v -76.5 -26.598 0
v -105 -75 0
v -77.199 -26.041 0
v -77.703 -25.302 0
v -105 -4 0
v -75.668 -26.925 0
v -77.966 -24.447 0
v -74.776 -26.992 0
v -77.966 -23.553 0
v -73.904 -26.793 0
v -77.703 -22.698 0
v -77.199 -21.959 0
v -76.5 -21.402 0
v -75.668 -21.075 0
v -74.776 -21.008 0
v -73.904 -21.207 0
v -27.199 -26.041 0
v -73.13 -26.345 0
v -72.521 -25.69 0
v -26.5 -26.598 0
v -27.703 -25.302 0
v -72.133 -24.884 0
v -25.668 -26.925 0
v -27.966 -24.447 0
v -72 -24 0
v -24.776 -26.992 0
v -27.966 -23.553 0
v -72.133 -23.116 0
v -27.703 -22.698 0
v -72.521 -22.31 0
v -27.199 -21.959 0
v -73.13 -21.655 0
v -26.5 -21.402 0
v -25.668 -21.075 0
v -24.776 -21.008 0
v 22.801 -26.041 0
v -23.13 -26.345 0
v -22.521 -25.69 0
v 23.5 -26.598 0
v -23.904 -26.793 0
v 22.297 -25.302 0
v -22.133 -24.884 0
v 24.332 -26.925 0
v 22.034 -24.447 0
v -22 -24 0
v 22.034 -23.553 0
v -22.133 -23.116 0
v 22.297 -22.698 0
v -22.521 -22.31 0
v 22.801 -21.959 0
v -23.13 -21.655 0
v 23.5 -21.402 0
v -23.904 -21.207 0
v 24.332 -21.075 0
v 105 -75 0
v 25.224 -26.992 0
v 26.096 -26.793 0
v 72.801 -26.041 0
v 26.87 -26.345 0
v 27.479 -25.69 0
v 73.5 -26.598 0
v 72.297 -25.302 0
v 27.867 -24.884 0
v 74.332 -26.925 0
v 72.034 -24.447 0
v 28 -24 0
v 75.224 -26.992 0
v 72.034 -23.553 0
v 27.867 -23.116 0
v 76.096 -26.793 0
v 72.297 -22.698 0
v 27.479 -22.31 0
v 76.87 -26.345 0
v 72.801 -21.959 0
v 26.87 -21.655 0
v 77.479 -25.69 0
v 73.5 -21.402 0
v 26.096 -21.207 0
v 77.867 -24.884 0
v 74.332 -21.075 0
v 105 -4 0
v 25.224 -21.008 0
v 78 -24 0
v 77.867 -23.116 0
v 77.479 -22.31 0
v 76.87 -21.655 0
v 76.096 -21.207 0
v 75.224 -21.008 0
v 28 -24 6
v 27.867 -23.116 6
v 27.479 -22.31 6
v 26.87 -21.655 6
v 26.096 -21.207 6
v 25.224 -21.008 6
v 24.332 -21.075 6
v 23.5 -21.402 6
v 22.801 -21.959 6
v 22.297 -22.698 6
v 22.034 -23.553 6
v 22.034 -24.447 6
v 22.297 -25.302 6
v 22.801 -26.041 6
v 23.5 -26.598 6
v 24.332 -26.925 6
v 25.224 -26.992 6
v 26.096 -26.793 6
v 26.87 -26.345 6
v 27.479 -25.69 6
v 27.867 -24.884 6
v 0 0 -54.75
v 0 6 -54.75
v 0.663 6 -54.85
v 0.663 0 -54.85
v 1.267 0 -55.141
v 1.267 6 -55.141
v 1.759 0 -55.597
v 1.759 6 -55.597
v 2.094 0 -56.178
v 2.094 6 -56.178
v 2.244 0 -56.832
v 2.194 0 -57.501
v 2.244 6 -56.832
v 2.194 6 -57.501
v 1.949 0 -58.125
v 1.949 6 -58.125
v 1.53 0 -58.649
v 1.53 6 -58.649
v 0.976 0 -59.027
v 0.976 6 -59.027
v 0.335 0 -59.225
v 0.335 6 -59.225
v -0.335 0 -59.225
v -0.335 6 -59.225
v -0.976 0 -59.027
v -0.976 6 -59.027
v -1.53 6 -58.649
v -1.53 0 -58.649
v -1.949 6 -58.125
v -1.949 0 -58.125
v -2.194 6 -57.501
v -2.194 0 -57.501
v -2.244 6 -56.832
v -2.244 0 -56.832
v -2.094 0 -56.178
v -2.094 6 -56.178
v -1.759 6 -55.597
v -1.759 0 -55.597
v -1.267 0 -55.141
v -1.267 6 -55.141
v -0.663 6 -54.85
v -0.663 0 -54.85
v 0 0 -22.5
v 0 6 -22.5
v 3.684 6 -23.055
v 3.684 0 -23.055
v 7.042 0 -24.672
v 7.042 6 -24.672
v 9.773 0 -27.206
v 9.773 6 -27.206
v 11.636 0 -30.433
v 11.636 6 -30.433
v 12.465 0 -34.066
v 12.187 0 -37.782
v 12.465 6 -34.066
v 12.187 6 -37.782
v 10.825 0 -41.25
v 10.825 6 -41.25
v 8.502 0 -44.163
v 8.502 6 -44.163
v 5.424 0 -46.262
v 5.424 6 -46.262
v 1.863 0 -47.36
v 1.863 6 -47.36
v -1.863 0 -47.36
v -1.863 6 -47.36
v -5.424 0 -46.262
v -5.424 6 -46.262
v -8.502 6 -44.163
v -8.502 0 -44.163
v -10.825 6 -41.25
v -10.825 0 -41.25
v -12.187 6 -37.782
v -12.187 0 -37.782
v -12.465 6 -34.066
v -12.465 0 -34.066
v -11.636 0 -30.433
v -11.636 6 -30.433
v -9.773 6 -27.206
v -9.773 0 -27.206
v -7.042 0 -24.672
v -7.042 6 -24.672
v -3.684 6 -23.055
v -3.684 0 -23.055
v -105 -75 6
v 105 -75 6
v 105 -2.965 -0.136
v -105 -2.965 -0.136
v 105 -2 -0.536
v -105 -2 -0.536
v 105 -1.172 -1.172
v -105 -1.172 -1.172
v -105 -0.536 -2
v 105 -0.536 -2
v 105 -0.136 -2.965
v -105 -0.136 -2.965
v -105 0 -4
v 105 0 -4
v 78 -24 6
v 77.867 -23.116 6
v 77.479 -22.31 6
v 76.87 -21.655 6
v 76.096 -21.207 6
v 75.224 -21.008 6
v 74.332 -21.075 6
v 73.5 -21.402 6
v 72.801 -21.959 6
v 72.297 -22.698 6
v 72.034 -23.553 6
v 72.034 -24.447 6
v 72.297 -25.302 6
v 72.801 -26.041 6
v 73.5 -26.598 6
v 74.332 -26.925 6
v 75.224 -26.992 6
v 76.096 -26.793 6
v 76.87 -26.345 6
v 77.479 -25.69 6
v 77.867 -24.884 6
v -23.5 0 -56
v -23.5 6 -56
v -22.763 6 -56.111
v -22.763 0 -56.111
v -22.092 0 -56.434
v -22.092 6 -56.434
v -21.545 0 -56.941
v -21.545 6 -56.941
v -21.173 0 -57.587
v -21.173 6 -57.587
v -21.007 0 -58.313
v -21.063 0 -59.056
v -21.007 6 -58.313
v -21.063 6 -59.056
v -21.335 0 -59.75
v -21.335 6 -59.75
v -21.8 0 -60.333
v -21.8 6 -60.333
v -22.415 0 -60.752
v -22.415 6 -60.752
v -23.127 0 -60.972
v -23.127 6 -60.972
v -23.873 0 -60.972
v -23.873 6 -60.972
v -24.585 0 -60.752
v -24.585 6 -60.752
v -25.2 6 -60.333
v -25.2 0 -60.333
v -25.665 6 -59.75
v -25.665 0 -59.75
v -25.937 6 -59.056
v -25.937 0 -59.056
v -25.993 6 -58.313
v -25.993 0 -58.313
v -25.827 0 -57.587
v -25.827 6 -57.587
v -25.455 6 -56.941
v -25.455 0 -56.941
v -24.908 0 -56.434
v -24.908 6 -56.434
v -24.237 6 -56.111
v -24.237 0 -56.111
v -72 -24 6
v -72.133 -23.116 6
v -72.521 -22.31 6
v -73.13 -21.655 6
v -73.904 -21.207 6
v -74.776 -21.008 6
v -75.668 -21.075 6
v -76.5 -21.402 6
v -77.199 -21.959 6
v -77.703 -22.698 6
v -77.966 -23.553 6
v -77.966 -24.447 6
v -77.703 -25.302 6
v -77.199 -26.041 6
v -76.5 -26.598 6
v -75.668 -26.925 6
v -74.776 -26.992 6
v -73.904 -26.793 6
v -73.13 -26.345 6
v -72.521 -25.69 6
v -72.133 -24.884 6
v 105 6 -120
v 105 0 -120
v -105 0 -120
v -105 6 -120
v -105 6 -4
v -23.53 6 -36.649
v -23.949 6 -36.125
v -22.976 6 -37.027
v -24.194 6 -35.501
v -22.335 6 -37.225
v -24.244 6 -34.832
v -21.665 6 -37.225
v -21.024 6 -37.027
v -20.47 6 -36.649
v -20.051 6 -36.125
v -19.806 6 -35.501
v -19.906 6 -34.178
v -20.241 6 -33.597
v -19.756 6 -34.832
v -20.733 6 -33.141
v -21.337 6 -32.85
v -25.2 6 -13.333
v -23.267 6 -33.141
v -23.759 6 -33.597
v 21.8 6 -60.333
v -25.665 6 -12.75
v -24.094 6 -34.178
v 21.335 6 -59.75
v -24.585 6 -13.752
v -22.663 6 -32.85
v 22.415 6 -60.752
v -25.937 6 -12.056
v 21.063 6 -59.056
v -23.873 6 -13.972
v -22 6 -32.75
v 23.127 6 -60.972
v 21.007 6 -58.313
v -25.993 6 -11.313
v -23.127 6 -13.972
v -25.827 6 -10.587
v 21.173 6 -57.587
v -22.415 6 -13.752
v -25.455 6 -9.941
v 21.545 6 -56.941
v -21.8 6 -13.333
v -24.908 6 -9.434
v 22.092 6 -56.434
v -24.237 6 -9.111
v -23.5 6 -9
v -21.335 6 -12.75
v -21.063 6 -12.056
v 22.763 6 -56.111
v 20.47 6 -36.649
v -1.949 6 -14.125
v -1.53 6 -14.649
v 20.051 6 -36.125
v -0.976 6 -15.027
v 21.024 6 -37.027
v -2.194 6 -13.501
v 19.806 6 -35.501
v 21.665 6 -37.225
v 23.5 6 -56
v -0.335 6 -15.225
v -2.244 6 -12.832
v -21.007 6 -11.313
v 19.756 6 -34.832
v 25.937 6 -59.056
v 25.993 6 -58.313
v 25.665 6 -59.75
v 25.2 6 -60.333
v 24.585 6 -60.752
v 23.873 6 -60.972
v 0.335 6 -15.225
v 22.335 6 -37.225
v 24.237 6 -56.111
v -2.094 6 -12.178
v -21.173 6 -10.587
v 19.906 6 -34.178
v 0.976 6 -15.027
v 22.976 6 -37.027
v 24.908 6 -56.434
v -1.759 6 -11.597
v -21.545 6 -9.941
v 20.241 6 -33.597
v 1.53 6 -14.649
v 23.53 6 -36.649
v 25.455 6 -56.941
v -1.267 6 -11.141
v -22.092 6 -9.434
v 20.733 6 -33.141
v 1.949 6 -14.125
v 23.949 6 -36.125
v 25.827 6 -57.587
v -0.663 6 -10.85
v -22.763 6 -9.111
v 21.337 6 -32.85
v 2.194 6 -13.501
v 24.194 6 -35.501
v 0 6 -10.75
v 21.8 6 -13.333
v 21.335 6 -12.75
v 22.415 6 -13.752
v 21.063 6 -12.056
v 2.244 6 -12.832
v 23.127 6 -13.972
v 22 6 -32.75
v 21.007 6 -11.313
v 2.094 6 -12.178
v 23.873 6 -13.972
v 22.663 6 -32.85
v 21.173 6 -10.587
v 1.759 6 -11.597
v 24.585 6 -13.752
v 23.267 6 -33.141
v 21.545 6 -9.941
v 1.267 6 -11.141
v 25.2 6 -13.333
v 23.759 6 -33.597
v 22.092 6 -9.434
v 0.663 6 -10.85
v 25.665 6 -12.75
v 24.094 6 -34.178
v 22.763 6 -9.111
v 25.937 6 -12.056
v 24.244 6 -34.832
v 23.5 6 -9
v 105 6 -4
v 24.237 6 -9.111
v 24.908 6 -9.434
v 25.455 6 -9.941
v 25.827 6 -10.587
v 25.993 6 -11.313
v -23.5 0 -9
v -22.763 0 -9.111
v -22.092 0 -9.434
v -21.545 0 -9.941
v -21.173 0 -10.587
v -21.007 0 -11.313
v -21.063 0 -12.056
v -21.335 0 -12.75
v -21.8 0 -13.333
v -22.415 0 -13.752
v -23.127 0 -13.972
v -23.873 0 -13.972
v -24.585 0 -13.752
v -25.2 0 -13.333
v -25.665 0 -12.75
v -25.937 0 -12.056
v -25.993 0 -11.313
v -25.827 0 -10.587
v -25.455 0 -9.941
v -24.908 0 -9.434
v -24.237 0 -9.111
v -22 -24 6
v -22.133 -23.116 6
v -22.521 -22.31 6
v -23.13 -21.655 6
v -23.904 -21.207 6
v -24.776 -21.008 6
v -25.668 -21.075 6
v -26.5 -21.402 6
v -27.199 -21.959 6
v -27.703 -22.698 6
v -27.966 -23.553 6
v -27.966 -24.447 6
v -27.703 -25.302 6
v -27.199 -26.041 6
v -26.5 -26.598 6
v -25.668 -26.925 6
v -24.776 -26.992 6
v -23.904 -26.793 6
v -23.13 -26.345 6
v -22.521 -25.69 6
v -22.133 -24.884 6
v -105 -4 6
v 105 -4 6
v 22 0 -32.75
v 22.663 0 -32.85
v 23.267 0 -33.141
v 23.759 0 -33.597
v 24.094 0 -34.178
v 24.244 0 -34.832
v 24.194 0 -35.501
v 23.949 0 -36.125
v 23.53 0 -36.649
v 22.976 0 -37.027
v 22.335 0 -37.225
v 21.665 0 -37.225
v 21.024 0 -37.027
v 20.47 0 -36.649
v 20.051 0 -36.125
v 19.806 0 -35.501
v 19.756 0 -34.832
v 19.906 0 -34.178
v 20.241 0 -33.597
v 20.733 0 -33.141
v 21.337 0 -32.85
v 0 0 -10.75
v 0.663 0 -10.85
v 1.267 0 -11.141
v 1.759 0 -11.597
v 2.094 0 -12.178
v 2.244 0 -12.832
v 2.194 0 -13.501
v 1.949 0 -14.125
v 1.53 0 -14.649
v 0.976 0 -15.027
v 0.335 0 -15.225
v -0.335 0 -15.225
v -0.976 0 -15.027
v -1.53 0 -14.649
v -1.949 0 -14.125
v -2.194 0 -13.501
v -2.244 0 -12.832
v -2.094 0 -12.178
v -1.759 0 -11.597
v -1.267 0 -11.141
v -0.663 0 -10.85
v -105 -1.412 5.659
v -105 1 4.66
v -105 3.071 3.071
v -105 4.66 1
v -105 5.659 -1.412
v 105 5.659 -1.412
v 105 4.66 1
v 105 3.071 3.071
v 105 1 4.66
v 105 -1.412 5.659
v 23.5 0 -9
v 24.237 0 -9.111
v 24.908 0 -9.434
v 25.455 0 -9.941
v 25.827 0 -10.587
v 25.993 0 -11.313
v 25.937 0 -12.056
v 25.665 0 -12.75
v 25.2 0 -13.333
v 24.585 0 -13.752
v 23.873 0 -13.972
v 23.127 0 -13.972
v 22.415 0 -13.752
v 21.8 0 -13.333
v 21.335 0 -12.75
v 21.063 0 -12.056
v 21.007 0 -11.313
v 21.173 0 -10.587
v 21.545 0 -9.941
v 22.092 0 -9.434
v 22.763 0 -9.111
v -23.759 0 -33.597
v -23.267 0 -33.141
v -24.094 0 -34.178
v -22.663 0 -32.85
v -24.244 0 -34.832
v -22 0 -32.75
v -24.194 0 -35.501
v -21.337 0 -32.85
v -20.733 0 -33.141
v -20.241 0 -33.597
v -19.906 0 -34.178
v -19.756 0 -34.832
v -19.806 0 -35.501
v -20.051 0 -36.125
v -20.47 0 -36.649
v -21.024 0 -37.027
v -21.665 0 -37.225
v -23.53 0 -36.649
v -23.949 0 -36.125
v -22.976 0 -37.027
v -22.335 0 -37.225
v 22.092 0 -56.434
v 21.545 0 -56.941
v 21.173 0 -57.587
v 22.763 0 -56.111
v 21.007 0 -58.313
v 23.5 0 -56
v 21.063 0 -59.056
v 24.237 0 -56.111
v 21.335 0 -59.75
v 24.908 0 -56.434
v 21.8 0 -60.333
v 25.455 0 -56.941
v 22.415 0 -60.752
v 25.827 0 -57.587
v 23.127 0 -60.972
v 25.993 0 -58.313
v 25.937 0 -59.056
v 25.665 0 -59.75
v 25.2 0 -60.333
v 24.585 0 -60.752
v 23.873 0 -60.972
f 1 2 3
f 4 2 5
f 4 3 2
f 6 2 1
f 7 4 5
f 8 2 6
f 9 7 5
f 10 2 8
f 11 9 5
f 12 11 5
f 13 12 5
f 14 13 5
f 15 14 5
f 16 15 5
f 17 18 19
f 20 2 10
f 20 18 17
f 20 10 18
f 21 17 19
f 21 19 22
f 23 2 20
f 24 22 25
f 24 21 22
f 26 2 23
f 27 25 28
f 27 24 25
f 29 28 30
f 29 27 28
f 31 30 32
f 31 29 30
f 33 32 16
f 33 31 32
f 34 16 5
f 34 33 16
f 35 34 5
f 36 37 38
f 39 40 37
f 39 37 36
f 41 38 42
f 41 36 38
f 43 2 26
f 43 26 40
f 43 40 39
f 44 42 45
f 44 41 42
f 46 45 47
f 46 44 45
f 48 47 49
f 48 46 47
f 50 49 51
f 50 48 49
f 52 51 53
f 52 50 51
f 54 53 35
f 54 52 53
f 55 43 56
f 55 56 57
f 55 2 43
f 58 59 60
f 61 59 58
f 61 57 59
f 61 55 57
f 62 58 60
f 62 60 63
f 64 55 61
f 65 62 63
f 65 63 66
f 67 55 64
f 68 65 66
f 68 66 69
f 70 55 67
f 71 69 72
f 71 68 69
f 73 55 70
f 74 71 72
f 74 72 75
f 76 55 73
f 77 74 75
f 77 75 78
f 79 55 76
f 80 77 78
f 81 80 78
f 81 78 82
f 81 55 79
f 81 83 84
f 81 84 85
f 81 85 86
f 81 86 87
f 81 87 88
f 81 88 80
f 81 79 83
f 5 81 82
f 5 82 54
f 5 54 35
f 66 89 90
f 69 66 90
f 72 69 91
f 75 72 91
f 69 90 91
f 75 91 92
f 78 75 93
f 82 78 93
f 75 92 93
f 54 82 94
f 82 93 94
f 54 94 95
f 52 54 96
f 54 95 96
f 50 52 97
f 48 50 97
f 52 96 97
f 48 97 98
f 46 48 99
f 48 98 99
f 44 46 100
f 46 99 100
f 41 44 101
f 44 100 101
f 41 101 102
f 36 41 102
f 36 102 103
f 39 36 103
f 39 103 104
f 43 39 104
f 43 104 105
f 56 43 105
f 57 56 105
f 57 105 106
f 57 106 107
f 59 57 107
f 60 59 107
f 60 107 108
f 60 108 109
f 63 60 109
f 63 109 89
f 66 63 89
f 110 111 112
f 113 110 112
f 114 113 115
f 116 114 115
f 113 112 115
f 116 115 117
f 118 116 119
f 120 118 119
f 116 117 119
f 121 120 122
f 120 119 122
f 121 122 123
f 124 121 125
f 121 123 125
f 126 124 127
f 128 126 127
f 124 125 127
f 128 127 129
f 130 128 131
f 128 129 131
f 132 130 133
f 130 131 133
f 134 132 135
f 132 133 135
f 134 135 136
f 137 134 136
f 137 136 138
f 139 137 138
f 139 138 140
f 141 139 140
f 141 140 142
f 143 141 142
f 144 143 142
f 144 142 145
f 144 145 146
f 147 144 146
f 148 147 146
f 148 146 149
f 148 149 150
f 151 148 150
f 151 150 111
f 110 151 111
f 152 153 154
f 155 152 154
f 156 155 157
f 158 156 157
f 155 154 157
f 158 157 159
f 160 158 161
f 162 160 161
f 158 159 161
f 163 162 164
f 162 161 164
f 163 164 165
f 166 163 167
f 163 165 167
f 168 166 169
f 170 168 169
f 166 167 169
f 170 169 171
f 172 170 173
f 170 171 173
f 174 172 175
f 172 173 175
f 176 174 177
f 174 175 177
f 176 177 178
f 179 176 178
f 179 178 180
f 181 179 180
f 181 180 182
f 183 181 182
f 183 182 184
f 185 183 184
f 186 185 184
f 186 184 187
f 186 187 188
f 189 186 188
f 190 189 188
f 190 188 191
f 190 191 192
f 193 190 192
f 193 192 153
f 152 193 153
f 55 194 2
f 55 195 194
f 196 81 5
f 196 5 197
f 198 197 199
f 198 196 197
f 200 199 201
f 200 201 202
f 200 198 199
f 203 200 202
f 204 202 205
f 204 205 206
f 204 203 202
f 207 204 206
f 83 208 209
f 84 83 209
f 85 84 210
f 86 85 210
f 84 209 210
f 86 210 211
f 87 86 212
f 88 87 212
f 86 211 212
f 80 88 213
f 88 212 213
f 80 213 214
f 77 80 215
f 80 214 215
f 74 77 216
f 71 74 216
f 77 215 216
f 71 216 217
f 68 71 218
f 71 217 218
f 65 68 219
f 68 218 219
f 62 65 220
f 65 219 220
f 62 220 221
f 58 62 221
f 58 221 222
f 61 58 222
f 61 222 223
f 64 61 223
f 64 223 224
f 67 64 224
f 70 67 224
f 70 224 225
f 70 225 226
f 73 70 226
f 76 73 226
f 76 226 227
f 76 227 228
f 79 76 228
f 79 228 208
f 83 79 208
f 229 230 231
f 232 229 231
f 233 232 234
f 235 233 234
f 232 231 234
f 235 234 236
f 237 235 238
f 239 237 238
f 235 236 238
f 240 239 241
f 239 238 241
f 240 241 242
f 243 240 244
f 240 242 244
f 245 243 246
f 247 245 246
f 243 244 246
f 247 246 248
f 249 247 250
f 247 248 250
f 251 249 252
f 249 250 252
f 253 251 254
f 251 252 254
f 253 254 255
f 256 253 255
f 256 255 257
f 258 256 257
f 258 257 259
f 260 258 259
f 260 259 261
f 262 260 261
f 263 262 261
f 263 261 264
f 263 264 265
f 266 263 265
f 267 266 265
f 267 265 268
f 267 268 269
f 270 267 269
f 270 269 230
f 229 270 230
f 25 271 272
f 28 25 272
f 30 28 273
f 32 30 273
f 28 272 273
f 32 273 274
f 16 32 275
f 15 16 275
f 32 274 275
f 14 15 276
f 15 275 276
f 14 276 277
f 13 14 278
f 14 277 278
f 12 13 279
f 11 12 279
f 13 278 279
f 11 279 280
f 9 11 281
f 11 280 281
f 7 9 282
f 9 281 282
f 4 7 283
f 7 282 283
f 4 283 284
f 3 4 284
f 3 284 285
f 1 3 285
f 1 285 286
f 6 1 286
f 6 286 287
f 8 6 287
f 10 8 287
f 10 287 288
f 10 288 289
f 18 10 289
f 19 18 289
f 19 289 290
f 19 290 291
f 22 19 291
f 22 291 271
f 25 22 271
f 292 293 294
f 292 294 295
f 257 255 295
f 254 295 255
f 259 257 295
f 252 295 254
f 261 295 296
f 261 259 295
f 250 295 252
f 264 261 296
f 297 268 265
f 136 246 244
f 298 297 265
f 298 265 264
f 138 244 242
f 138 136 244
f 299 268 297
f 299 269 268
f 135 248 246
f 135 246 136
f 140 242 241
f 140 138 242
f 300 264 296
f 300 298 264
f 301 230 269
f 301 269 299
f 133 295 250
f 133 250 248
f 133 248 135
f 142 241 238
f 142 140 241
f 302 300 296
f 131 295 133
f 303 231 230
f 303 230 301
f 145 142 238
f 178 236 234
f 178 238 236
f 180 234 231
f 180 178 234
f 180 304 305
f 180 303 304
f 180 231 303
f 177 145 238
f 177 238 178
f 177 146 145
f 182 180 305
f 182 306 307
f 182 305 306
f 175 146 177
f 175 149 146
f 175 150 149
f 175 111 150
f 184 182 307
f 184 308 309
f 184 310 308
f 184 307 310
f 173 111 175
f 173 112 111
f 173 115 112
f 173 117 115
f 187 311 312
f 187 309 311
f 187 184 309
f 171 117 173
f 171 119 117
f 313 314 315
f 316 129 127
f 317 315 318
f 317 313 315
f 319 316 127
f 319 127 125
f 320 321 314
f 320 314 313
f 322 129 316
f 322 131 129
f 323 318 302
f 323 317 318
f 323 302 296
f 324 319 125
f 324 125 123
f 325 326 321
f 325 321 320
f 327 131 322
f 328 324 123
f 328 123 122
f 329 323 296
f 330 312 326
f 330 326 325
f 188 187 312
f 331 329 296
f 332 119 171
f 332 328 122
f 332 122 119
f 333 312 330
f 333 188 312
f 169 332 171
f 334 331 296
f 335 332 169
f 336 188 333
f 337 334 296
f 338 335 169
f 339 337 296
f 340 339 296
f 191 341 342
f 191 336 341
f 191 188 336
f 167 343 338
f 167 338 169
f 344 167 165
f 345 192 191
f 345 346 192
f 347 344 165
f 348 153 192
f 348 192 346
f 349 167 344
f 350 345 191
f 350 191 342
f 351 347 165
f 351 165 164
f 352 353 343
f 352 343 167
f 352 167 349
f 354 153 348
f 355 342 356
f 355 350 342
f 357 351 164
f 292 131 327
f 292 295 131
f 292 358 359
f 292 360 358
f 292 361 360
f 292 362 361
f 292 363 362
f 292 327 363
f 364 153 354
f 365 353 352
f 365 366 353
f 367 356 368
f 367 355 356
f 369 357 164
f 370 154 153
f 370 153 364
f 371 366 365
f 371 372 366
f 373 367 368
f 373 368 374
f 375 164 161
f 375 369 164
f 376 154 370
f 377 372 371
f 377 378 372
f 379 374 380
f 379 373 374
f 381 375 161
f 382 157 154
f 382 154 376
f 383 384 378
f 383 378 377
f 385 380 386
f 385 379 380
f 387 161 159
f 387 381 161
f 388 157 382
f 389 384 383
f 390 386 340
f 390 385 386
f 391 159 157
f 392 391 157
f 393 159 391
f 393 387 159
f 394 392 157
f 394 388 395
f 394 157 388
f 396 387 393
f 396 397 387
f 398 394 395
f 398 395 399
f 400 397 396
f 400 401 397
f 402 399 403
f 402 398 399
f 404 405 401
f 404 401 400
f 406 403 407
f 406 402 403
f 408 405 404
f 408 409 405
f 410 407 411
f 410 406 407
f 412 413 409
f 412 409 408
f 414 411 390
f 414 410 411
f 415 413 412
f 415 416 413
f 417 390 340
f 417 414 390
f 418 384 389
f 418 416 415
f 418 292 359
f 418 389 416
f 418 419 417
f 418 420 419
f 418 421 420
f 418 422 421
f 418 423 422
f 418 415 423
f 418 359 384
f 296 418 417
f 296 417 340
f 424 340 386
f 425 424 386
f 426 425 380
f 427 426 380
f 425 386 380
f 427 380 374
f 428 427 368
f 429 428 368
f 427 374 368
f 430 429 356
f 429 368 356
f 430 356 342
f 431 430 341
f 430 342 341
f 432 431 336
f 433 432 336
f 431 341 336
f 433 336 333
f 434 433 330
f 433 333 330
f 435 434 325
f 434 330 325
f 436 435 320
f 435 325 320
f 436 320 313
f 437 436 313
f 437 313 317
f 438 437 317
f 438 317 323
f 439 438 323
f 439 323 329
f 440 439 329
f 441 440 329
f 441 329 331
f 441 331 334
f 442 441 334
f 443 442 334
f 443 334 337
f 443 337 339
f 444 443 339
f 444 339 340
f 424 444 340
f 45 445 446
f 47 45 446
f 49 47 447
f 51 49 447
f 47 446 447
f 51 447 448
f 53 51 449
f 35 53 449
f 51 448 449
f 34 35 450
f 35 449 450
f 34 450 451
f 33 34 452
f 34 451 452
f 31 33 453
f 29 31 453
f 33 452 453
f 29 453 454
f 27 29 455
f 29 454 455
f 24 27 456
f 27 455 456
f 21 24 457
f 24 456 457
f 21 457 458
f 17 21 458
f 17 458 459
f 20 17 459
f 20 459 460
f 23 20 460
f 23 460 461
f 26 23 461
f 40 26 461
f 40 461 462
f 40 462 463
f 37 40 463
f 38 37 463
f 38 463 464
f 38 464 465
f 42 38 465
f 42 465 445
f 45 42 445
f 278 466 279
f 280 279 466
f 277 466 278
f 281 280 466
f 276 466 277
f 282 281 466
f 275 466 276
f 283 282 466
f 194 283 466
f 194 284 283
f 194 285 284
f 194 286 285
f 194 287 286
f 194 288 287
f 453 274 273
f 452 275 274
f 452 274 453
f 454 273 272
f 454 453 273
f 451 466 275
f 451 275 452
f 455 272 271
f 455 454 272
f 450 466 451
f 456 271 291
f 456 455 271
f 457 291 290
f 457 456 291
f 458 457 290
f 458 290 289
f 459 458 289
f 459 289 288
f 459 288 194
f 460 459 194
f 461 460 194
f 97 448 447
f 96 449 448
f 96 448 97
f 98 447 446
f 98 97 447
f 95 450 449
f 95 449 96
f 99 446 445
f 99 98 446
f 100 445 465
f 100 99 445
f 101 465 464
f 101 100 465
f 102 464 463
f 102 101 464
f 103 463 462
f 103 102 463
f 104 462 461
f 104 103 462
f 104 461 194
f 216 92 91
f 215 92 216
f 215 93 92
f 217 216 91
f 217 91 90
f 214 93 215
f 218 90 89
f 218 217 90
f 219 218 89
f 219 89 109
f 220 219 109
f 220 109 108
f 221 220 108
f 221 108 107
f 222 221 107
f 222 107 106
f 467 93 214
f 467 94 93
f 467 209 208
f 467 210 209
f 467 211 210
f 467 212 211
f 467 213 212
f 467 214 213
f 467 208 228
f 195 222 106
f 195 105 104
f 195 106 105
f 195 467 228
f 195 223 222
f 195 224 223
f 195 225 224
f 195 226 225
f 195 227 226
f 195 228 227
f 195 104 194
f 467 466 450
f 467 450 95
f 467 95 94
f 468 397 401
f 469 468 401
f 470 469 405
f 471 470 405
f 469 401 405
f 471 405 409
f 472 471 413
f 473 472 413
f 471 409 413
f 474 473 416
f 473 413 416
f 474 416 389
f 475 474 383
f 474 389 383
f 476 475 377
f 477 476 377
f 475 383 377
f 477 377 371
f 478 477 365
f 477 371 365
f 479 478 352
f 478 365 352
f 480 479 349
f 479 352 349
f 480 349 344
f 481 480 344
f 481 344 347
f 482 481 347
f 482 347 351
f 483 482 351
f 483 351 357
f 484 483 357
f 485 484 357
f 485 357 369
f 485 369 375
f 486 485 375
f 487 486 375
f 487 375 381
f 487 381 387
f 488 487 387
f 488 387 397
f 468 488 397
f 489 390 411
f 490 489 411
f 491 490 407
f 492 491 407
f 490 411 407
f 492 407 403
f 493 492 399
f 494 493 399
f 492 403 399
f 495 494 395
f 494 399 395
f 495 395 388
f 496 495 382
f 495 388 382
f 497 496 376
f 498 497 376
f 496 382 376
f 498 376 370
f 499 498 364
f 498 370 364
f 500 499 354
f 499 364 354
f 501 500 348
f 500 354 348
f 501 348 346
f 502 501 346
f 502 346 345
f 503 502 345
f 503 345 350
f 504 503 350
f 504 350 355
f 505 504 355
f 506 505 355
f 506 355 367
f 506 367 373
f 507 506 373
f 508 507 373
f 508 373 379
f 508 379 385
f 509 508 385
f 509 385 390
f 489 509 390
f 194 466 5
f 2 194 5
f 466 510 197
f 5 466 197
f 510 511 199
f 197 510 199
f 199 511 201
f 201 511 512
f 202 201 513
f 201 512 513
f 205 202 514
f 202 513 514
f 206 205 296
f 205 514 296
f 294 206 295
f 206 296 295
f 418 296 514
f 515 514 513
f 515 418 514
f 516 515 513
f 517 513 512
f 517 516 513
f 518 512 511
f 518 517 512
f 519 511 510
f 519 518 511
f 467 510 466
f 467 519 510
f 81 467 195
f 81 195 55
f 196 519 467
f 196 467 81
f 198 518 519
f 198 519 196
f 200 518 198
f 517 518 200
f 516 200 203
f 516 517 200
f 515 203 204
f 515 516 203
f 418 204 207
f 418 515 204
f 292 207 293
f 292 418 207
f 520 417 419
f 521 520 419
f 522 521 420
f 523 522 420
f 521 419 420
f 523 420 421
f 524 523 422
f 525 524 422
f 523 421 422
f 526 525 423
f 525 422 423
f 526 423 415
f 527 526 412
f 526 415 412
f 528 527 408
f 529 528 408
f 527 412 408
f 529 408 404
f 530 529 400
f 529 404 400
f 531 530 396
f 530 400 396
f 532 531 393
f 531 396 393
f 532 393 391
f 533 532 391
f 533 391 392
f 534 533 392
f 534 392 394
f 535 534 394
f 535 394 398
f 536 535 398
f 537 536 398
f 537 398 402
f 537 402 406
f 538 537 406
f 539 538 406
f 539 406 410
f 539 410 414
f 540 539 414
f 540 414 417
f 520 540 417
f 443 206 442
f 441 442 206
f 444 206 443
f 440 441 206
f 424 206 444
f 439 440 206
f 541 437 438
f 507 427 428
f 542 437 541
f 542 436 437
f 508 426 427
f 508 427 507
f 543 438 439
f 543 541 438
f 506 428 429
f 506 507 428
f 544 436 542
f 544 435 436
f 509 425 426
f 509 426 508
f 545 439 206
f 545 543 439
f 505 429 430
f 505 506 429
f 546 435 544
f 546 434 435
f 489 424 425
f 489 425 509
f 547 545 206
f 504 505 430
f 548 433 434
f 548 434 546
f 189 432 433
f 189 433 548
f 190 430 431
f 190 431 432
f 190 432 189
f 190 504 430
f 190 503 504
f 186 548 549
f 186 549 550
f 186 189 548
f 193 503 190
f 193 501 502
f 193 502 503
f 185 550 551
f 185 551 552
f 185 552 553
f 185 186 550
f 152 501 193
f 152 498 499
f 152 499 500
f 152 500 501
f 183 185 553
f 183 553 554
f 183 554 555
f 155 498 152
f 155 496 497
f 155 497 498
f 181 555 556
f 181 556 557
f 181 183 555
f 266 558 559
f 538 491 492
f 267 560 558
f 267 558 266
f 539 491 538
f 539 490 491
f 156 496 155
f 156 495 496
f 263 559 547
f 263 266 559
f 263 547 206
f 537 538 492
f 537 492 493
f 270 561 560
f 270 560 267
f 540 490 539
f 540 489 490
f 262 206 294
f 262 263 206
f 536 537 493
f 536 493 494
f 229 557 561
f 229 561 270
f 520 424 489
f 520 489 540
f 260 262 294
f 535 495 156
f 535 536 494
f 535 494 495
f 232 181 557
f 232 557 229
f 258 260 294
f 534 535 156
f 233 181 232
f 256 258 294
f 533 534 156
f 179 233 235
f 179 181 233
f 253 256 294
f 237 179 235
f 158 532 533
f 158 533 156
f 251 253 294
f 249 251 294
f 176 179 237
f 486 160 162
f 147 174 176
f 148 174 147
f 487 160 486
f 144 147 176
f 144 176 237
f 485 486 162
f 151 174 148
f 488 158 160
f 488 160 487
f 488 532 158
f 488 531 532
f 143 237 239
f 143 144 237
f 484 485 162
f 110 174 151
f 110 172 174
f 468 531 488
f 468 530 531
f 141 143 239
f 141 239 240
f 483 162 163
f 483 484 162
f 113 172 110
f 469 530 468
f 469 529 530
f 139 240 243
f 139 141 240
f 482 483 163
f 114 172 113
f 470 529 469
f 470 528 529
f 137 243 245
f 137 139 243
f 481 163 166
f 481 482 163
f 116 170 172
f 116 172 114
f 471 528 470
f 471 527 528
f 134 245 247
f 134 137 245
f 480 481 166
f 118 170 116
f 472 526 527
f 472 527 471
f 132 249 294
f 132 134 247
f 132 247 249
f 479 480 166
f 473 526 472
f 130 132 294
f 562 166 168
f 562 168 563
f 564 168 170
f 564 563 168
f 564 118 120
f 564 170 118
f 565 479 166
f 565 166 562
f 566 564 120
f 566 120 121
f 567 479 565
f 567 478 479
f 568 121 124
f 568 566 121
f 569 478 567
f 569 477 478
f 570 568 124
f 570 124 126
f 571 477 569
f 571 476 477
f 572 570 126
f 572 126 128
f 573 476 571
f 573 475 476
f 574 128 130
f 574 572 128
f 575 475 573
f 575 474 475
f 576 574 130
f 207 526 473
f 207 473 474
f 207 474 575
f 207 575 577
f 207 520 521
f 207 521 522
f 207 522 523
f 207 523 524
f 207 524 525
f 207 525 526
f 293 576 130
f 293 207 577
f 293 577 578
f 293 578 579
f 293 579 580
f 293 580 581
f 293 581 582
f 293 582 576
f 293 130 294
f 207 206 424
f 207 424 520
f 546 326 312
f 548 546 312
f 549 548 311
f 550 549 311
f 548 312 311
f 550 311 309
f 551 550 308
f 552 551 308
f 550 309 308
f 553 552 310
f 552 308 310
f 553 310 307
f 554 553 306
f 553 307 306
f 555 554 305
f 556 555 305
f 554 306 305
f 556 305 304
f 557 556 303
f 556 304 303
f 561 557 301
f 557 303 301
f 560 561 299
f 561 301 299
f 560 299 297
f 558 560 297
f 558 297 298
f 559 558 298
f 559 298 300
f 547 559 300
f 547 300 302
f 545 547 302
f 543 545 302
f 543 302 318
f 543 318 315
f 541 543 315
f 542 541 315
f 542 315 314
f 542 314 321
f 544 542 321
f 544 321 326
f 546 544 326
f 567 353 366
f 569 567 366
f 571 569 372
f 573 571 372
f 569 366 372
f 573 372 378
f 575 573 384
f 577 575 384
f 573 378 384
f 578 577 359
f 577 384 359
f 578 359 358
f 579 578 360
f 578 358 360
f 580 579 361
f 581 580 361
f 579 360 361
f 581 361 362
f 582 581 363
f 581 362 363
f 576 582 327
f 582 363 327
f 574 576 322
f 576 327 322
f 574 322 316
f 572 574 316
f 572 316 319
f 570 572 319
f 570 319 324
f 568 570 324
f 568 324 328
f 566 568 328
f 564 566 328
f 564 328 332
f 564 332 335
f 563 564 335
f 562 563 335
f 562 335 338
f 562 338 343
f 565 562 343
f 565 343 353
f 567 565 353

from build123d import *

# Parameters (mm, degrees)
BASE_FLANGE1_DEPTH = 105
SKETCH6_R          = 12.5
SKETCH6_R_2        = 2.5
CUT_EXTRUDE1_DEPTH = 10
SKETCH7_R          = 3
CUT_EXTRUDE2_DEPTH = 10
SKETCH8_R          = 2.25
CUT_EXTRUDE3_DEPTH = 10


# Sheet-metal steps are written as plain solids
with BuildPart() as part:
    # Sketch1 → Base-Flange1 (new, symmetric)
    with BuildSketch(Plane(origin=(0, 0, 0), x_dir=(0, 0, -1), z_dir=(1, 0, 0))):
        with BuildLine():
            Line((0, -75), (0, -4))
            ThreePointArc((0, -4), (1.171572875, -1.171572875), (4, 0))
            Line((4, 0), (120, 0))
            Line((120, 0), (120, 6))
            Line((120, 6), (4, 6))
            ThreePointArc((4, 6), (-3.071067812, 3.071067812), (-6, -4))
            Line((-6, -4), (-6, -75))
            Line((-6, -75), (0, -75))
        make_face()
    extrude(amount=BASE_FLANGE1_DEPTH, both=True)

    # Sketch6 → Cut-Extrude1 (cut)
    with BuildSketch(Plane(origin=(0, 6, 0), x_dir=(1, 0, 0), z_dir=(0, 1, 0))):
        with Locations(Location((0, 35, 0), (0, 0, 270))):
            Circle(SKETCH6_R)
        with Locations(Location((23.5, 58.5, 0), (0, 0, 270))):
            Circle(SKETCH6_R_2)
        with Locations(Location((-23.5, 58.5, 0), (0, 0, 270))):
            Circle(SKETCH6_R_2)
        with Locations(Location((-23.5, 11.5, 0), (0, 0, 270))):
            Circle(SKETCH6_R_2)
        with Locations(Location((23.5, 11.5, 0), (0, 0, 270))):
            Circle(SKETCH6_R_2)
    extrude(amount=-CUT_EXTRUDE1_DEPTH, mode=Mode.SUBTRACT)

    # Sketch7 → Cut-Extrude2 (cut)
    with BuildSketch(Plane.XY.offset(6)):
        with Locations((-75, -24)):
            Circle(SKETCH7_R)
        with Locations((-25, -24)):
            Circle(SKETCH7_R)
        with Locations((25, -24)):
            Circle(SKETCH7_R)
        with Locations((75, -24)):
            Circle(SKETCH7_R)
    extrude(amount=-CUT_EXTRUDE2_DEPTH, mode=Mode.SUBTRACT)

    # Sketch8 → Cut-Extrude3 (cut)
    with BuildSketch(Plane(origin=(0, 6, 0), x_dir=(1, 0, 0), z_dir=(0, 1, 0))):
        with Locations(Location((0, 13, 0), (0, 0, 270))):
            Circle(SKETCH8_R)
        with Locations(Location((-22, 35, 0), (0, 0, 270))):
            Circle(SKETCH8_R)
        with Locations(Location((0, 57, 0), (0, 0, 270))):
            Circle(SKETCH8_R)
        with Locations(Location((22, 35, 0), (0, 0, 270))):
            Circle(SKETCH8_R)
    extrude(amount=-CUT_EXTRUDE3_DEPTH, mode=Mode.SUBTRACT)


solid = part.part
